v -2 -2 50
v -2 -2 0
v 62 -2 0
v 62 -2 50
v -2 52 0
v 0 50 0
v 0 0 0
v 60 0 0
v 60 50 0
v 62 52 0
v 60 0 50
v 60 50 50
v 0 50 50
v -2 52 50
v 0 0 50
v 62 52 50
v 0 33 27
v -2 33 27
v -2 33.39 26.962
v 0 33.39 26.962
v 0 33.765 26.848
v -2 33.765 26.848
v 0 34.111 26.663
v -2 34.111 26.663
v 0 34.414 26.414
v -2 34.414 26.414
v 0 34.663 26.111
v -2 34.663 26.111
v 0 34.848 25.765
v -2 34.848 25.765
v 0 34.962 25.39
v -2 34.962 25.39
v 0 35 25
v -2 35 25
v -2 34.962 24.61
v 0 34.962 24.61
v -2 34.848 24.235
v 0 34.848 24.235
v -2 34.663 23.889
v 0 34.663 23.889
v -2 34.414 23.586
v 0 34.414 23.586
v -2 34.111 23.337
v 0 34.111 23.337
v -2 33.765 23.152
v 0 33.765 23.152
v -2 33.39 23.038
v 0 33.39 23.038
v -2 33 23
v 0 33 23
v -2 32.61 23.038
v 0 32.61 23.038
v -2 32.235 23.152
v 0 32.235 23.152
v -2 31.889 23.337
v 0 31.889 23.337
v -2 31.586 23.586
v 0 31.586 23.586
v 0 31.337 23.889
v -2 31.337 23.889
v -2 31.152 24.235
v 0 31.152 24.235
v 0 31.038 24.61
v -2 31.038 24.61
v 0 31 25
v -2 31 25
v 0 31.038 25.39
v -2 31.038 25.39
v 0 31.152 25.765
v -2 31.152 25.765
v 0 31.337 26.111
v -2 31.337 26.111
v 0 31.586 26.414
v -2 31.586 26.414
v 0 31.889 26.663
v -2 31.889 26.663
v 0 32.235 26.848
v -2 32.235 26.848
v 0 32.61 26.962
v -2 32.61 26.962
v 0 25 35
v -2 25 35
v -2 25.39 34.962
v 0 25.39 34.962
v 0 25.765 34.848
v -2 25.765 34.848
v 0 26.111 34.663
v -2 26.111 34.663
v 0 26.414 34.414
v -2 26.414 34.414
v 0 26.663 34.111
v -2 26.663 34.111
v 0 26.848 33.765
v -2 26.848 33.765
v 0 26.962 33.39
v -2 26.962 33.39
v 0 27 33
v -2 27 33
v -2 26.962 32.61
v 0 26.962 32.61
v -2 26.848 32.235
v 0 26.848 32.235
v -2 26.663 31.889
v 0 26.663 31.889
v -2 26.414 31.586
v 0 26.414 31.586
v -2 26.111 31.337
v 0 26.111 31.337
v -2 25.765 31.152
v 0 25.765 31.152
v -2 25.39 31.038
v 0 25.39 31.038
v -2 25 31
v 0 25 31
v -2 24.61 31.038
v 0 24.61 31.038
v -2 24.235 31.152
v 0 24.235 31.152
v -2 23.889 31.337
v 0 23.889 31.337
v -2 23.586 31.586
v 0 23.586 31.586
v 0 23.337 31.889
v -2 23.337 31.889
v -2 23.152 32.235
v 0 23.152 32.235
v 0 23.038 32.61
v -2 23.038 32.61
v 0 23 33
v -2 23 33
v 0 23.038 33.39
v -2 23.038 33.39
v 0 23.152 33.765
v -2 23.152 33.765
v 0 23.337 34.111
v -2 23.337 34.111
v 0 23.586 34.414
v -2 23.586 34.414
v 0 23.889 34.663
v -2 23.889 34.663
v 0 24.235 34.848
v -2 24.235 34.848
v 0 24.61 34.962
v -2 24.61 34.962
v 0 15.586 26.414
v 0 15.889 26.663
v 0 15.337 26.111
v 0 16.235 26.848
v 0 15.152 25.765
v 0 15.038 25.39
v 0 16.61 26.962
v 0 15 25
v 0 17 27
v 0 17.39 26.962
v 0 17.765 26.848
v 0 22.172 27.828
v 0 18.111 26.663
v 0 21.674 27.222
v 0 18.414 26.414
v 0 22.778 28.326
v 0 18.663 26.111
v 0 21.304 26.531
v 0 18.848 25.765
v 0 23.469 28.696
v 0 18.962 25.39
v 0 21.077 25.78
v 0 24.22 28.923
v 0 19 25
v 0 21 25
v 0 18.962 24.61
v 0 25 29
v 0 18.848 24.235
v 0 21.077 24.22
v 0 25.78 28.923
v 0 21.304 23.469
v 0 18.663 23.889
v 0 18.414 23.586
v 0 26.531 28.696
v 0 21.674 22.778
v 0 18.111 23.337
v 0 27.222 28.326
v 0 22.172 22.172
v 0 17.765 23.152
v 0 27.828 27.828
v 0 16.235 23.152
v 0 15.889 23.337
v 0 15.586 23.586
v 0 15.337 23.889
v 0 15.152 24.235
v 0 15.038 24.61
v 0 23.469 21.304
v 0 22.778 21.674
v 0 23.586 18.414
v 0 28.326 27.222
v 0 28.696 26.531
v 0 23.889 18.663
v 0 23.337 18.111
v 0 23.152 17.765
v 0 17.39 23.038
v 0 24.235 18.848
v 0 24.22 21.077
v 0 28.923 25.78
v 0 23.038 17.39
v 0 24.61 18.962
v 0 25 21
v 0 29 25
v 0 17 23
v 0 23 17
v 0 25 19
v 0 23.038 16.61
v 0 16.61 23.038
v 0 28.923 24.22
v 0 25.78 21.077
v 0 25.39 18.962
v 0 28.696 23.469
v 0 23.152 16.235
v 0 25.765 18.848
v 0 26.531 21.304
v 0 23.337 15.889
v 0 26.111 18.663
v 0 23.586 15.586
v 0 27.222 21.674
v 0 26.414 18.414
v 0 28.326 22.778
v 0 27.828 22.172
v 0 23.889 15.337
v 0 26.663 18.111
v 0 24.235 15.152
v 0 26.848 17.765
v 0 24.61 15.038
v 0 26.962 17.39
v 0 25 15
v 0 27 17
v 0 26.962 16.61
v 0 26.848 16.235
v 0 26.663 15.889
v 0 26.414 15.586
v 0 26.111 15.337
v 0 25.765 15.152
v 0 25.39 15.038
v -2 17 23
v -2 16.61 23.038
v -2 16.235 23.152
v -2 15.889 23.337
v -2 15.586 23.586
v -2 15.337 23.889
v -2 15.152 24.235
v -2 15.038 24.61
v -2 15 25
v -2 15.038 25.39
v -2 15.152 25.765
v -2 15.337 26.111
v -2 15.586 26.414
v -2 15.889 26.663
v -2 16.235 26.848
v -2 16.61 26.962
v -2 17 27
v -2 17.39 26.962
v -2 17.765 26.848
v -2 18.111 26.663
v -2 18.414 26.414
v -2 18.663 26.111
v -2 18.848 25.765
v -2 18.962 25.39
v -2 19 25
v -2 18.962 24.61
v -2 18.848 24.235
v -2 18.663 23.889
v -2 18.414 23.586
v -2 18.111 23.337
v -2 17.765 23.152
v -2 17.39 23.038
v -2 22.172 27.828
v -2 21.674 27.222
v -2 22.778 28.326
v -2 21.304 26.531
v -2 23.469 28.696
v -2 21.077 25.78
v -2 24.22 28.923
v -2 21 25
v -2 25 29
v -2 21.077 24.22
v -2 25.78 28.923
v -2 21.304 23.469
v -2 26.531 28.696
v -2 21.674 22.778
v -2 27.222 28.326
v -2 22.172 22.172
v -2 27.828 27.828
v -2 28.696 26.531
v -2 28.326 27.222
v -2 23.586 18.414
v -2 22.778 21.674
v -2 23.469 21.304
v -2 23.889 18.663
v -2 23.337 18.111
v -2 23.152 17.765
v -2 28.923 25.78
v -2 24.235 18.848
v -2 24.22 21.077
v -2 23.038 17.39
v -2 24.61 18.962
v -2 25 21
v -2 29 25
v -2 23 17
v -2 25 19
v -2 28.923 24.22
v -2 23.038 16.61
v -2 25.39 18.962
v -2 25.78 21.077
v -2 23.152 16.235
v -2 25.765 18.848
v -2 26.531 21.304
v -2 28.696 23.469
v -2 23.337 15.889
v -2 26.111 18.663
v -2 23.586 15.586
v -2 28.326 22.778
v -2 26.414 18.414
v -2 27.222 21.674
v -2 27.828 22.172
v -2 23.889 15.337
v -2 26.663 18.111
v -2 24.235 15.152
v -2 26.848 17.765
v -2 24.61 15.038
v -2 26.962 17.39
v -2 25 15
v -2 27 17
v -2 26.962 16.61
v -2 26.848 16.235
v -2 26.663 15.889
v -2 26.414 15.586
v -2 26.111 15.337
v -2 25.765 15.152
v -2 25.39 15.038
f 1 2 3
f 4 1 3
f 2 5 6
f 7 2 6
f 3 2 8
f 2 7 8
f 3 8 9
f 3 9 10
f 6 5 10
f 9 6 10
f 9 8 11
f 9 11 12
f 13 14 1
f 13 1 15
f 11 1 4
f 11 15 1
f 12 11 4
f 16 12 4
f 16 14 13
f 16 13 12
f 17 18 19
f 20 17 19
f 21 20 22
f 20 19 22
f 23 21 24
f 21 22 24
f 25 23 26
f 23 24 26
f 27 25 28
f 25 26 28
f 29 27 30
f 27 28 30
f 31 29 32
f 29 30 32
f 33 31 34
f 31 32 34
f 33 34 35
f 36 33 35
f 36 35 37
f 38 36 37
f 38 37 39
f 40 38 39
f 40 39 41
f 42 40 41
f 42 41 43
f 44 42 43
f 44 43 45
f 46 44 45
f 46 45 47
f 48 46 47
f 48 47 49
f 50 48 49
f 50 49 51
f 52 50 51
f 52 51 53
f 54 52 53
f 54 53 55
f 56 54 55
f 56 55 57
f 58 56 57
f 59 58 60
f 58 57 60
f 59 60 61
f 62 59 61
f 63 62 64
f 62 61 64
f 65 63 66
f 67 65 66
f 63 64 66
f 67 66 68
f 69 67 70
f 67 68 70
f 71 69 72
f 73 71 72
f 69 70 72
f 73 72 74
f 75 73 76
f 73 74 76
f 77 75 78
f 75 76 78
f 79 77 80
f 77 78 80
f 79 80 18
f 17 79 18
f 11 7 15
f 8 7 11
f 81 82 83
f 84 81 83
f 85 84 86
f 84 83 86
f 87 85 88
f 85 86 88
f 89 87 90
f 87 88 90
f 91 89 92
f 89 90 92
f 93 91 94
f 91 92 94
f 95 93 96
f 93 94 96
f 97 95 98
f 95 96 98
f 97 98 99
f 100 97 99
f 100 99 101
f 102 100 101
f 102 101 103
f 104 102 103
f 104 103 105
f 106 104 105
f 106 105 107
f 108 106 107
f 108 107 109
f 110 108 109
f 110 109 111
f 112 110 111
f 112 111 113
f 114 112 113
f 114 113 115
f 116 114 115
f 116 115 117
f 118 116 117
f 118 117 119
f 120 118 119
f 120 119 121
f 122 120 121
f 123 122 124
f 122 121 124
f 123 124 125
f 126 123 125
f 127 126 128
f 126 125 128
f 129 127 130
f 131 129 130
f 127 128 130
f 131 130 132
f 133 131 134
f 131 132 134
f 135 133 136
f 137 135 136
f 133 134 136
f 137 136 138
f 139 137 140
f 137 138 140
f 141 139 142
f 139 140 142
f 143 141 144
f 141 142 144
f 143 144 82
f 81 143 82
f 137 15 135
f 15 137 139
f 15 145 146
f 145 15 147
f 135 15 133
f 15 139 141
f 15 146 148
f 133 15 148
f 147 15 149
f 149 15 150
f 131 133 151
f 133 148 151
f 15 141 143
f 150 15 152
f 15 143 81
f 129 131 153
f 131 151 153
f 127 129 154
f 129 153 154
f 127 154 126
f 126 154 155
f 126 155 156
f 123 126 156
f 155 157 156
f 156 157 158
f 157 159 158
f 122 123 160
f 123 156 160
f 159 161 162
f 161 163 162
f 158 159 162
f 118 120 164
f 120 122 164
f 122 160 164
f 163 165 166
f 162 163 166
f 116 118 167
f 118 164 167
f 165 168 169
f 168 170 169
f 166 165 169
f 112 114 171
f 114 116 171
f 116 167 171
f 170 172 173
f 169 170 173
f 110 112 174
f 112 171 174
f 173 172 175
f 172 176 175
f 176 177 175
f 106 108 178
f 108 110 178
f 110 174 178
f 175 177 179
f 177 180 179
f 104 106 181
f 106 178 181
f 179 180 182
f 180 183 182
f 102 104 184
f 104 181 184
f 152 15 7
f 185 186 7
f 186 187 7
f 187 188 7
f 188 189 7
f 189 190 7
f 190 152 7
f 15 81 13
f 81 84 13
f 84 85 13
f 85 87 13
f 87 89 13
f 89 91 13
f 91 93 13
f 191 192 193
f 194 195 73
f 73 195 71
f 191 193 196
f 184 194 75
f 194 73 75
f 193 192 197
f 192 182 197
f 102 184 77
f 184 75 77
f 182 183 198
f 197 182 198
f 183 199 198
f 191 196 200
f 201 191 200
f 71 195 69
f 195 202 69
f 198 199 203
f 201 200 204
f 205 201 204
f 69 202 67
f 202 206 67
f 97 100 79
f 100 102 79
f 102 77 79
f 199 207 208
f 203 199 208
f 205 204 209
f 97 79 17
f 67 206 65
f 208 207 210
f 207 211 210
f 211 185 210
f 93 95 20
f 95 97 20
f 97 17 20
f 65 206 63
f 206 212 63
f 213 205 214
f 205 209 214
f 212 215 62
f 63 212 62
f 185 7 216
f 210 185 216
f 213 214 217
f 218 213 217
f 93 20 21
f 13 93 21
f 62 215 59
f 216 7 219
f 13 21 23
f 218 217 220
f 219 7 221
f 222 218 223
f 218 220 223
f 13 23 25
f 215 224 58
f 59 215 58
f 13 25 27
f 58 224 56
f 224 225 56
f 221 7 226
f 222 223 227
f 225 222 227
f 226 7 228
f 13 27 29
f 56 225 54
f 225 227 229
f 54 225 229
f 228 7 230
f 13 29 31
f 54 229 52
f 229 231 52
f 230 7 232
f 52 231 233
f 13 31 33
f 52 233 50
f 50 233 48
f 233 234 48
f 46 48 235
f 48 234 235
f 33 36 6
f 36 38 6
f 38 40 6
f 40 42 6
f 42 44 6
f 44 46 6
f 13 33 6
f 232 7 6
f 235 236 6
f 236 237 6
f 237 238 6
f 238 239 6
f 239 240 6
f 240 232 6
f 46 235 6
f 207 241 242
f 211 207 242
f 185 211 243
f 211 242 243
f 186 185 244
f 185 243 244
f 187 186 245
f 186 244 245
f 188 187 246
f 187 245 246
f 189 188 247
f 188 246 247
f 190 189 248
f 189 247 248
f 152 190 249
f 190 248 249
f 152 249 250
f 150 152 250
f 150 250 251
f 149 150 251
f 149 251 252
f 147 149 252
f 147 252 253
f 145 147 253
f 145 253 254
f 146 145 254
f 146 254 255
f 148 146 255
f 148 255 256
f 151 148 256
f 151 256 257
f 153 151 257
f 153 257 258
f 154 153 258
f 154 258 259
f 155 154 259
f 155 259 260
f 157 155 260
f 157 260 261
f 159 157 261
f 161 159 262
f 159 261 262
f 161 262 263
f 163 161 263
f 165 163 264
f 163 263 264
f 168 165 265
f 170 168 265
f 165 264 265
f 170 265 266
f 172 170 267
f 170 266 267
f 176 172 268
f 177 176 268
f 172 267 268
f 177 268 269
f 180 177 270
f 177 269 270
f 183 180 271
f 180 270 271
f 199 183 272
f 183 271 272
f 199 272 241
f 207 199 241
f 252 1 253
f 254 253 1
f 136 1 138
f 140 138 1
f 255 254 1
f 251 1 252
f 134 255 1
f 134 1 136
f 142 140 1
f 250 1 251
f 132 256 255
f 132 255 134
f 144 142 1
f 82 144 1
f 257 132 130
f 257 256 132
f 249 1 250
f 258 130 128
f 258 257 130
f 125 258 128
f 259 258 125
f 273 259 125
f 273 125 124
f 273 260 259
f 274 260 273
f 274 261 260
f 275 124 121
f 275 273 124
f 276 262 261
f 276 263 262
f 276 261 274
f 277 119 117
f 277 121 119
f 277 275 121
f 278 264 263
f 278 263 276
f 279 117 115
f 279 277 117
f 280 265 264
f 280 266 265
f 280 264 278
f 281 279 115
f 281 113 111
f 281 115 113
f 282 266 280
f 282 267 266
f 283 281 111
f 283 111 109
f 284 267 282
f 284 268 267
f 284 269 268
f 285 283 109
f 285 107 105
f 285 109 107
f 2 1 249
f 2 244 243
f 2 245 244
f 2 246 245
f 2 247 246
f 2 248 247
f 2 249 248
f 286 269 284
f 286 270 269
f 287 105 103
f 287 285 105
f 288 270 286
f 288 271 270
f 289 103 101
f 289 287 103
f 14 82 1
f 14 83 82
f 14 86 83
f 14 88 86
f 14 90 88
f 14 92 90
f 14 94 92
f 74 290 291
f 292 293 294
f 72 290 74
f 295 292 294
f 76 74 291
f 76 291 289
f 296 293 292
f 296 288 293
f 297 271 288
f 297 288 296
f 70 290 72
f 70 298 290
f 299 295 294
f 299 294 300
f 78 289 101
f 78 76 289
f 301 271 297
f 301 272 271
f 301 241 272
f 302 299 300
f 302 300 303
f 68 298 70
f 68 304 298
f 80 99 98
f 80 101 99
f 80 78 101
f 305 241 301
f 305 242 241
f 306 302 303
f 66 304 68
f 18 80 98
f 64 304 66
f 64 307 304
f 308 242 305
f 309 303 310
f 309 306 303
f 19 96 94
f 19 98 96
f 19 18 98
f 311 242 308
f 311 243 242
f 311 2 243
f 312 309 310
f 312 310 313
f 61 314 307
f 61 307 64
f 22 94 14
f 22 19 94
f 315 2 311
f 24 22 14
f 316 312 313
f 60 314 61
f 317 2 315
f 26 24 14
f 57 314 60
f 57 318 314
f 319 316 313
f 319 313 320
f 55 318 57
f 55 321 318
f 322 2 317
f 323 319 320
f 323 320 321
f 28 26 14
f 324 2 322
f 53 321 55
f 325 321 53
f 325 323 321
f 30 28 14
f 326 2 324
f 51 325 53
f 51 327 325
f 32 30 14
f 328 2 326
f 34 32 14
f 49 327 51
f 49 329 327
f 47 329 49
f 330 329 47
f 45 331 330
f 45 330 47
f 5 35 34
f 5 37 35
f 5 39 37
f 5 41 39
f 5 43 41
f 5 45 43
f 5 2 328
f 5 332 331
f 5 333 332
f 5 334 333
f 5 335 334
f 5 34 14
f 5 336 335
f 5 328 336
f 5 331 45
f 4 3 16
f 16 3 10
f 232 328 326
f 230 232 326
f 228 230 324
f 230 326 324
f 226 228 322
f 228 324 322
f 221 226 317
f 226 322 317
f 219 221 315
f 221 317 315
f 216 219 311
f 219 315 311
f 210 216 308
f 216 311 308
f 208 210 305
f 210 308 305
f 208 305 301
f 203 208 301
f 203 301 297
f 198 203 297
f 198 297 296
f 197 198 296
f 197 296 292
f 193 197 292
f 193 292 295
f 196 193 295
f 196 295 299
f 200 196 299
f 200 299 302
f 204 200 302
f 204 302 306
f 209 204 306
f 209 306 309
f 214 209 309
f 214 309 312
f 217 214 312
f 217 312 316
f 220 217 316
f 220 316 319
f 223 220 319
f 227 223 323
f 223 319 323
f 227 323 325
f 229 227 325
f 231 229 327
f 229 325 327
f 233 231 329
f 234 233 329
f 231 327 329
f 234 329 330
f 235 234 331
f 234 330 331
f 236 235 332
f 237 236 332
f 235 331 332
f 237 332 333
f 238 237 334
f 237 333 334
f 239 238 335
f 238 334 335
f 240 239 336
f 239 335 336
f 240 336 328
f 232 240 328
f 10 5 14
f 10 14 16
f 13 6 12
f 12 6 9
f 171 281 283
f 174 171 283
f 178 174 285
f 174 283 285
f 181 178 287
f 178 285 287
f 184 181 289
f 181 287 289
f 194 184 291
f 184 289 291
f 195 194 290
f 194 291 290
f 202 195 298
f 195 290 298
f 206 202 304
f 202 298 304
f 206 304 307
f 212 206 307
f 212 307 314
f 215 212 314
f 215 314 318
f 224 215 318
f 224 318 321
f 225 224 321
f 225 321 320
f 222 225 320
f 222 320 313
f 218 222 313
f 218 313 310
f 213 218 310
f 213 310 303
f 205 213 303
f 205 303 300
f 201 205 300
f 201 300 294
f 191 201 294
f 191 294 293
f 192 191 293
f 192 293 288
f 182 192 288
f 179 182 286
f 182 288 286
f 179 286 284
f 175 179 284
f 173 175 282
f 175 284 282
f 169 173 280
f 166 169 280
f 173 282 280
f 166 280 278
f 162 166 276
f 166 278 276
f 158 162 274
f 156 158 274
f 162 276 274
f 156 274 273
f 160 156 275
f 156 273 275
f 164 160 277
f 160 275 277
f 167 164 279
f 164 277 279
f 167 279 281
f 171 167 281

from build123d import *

# Parameters (mm, degrees)
IZIM1_W               = 64
IZIM1_H               = 54
IZIM1_W_2             = 60
IZIM1_H_2             = 50
EKSTR_ZYON_NCE1_DEPTH = 50
KES_EKSTR_ZYON1_REACH = 98.437
IZIM2_R               = 4
IZIM2_R_2             = 2


with BuildPart() as part:
    # Çizim1 → Ekstrüzyon-İnce1 (new body)
    with BuildSketch(Plane.XY):
        with Locations((30, 25)):
            Rectangle(IZIM1_W, IZIM1_H)
        with Locations((30, 25)):
            Rectangle(IZIM1_W_2, IZIM1_H_2, mode=Mode.SUBTRACT)
    extrude(amount=EKSTR_ZYON_NCE1_DEPTH)

    # Çizim2 → Kes-Ekstrüzyon1 (cut, up to next)
    with BuildSketch(Plane.ZY.offset(2), mode=Mode.PRIVATE) as kes_ekstr_zyon1_sk1:
        with Locations((25, 25)):
            Circle(IZIM2_R)
    kes_ekstr_zyon1_tool1 = extrude(kes_ekstr_zyon1_sk1.sketch, amount=-KES_EKSTR_ZYON1_REACH, mode=Mode.PRIVATE) & part.part
    # Çizim2 → Kes-Ekstrüzyon1 (cut, up to next)
    with BuildSketch(Plane.ZY.offset(2), mode=Mode.PRIVATE) as kes_ekstr_zyon1_sk2:
        with Locations((33, 25)):
            Circle(IZIM2_R_2)
    kes_ekstr_zyon1_tool2 = extrude(kes_ekstr_zyon1_sk2.sketch, amount=-KES_EKSTR_ZYON1_REACH, mode=Mode.PRIVATE) & part.part
    # Çizim2 → Kes-Ekstrüzyon1 (cut, up to next)
    with BuildSketch(Plane.ZY.offset(2), mode=Mode.PRIVATE) as kes_ekstr_zyon1_sk3:
        with Locations(Location((17, 25, 0), (0, 0, 180))):
            Circle(IZIM2_R_2)
    kes_ekstr_zyon1_tool3 = extrude(kes_ekstr_zyon1_sk3.sketch, amount=-KES_EKSTR_ZYON1_REACH, mode=Mode.PRIVATE) & part.part
    # Çizim2 → Kes-Ekstrüzyon1 (cut, up to next)
    with BuildSketch(Plane.ZY.offset(2), mode=Mode.PRIVATE) as kes_ekstr_zyon1_sk4:
        with Locations((25, 33)):
            Circle(IZIM2_R_2)
    kes_ekstr_zyon1_tool4 = extrude(kes_ekstr_zyon1_sk4.sketch, amount=-KES_EKSTR_ZYON1_REACH, mode=Mode.PRIVATE) & part.part
    # Çizim2 → Kes-Ekstrüzyon1 (cut, up to next)
    with BuildSketch(Plane.ZY.offset(2), mode=Mode.PRIVATE) as kes_ekstr_zyon1_sk5:
        with Locations(Location((25, 17, 0), (0, 0, 180))):
            Circle(IZIM2_R_2)
    kes_ekstr_zyon1_tool5 = extrude(kes_ekstr_zyon1_sk5.sketch, amount=-KES_EKSTR_ZYON1_REACH, mode=Mode.PRIVATE) & part.part
    add(kes_ekstr_zyon1_tool1.solids().sort_by_distance((-2, 25, 25))[0], mode=Mode.SUBTRACT)
    add(kes_ekstr_zyon1_tool2.solids().sort_by_distance((-2, 25, 33))[0], mode=Mode.SUBTRACT)
    add(kes_ekstr_zyon1_tool3.solids().sort_by_distance((-2, 25, 17))[0], mode=Mode.SUBTRACT)
    add(kes_ekstr_zyon1_tool4.solids().sort_by_distance((-2, 33, 25))[0], mode=Mode.SUBTRACT)
    add(kes_ekstr_zyon1_tool5.solids().sort_by_distance((-2, 17, 25))[0], mode=Mode.SUBTRACT)


solid = part.part
